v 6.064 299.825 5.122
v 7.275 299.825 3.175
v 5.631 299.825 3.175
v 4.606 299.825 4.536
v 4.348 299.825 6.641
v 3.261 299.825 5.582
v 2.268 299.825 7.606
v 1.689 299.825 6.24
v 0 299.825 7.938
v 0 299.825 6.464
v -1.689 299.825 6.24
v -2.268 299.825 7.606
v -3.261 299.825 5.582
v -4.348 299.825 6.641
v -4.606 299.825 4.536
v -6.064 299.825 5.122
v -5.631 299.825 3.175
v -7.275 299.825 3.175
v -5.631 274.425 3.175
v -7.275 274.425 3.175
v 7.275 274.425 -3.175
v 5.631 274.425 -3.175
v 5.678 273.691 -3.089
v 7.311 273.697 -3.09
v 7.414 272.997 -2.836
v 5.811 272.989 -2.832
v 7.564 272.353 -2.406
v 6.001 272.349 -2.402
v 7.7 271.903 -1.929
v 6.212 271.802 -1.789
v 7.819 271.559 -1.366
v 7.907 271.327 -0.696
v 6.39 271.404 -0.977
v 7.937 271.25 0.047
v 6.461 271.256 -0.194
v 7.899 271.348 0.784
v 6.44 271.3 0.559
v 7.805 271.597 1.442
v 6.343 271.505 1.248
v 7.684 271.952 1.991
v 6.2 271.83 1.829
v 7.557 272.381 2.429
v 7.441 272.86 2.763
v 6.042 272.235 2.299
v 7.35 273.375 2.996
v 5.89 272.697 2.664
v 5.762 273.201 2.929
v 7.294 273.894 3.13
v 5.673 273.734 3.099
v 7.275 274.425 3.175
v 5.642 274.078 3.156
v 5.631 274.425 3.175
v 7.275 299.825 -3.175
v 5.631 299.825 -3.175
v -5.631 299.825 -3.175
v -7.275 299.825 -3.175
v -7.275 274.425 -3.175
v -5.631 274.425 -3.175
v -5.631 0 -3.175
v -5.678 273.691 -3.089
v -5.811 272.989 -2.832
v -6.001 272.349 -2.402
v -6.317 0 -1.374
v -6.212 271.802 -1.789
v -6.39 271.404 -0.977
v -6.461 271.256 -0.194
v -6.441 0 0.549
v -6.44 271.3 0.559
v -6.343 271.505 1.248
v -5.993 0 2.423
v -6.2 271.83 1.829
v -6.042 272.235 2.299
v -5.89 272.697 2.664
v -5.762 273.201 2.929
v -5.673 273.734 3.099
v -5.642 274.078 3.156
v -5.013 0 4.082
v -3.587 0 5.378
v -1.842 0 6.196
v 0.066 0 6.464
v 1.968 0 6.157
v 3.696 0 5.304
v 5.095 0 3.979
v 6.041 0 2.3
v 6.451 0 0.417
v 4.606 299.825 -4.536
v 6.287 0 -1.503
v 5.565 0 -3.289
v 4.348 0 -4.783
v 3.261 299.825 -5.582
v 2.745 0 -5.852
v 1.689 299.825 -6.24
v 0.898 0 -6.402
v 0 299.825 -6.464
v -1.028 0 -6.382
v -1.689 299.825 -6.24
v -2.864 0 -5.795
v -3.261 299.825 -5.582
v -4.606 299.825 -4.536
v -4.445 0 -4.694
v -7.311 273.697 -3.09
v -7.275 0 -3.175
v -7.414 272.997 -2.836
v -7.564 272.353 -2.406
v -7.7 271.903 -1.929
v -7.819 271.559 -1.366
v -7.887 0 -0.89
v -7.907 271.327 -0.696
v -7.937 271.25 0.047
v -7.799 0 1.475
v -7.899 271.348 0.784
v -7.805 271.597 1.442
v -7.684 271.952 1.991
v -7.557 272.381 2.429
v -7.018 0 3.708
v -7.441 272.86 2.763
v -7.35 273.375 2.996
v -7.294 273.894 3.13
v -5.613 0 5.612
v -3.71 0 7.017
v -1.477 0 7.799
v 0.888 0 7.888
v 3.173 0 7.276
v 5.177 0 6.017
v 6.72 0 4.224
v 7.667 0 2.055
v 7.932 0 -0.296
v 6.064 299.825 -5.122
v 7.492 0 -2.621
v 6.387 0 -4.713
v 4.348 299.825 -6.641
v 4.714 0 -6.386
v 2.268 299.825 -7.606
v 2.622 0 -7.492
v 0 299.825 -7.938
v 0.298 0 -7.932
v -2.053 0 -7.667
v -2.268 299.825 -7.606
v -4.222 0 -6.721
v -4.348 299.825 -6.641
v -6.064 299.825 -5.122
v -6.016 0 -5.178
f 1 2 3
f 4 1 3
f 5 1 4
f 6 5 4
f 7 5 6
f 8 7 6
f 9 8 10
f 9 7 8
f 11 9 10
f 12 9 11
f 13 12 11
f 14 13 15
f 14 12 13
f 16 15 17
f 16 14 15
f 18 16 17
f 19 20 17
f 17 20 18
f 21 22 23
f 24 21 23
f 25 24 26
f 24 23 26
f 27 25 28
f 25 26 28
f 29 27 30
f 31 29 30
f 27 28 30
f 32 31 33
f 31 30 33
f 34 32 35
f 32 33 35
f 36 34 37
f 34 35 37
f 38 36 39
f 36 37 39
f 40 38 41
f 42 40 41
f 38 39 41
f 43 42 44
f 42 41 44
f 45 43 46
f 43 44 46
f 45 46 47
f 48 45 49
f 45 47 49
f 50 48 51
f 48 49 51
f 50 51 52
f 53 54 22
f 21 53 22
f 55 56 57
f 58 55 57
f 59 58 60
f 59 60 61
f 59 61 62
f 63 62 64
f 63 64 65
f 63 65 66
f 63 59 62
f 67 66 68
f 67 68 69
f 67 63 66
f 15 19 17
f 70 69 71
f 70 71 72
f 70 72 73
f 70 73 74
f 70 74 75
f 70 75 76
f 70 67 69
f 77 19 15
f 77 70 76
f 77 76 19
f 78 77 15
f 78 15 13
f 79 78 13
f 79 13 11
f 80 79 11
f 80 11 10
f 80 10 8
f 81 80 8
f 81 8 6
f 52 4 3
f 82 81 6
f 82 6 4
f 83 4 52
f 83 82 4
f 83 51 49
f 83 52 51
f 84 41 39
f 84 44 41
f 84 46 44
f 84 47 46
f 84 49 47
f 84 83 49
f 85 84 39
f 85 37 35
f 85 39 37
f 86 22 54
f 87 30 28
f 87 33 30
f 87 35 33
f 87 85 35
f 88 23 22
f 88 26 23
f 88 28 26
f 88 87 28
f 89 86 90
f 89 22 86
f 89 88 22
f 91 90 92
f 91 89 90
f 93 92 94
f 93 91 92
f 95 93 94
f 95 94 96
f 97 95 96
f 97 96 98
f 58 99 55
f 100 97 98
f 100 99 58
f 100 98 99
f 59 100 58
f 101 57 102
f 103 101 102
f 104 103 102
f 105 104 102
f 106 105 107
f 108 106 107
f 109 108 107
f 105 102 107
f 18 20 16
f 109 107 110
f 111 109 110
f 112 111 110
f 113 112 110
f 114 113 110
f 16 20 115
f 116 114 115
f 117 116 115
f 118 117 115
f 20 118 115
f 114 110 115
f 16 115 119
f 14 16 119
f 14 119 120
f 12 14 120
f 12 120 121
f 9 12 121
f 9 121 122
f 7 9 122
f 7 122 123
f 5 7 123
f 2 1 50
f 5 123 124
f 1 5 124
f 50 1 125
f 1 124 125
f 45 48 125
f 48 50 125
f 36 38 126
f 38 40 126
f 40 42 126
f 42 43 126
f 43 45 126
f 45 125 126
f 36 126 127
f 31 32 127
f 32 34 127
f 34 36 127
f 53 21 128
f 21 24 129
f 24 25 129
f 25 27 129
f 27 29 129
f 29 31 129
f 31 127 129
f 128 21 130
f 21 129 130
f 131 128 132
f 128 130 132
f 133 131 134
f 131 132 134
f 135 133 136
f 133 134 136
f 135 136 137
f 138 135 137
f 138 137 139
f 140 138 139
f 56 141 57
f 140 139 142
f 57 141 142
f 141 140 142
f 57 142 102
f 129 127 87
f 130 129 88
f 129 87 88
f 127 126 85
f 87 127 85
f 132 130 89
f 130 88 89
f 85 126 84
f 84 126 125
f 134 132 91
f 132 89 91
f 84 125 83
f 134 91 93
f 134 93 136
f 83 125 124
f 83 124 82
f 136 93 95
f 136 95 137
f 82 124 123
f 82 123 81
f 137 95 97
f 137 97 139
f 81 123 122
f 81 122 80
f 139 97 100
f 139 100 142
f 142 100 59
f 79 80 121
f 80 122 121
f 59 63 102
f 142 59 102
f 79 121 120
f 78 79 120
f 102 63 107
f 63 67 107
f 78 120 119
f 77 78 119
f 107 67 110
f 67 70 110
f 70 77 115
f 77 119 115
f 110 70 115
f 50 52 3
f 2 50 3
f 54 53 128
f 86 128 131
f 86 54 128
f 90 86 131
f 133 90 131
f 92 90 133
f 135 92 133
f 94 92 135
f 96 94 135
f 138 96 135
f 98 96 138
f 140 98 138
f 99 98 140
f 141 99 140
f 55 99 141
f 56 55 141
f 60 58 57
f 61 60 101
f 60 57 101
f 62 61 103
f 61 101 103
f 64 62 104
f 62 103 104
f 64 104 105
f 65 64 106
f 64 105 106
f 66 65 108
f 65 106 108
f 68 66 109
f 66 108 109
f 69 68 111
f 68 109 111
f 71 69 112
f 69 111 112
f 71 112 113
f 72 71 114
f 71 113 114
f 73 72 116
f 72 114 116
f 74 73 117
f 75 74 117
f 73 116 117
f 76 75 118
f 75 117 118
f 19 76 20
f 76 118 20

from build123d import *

# Parameters (mm, degrees)
SKETCH1_R               = 7.9375
SKETCH1_R_2             = 6.4643
BOSS_EXTRUDE1_DEPTH     = 299.825008041
CUT_EXTRUDE1_DEPTH      = 9.525
CUT_EXTRUDE1_DEPTH_BACK = 9.525


with BuildPart() as part:
    # Sketch1 → Boss-Extrude1 (new body)
    with BuildSketch(Plane(origin=(0, 0, 0), x_dir=(1, 0, 0), z_dir=(0, 1, 0))):
        with Locations(Location((0, 0, 0), (0, 0, 156.421821522))):
            Circle(SKETCH1_R)
        with Locations(Location((0, 0, 0), (0, 0, 150.583203301))):
            Circle(SKETCH1_R_2, mode=Mode.SUBTRACT)
    extrude(amount=BOSS_EXTRUDE1_DEPTH)

    # Sketch2 → Cut-Extrude1 (cut, two sides: drawn at the far end of the back side and taken through both)
    with BuildSketch(Plane(origin=(0, 0, 0), x_dir=(0, 0, -1), z_dir=(1, 0, 0)).offset(-CUT_EXTRUDE1_DEPTH_BACK)):
        with BuildLine():
            Line((3.175, 299.825008041), (3.175, 274.425008041))
            ThreePointArc((3.175, 274.425008041), (0, 271.250008041), (-3.175, 274.425008041))
            Line((-3.175, 274.425008041), (-3.175, 299.825008041))
            Line((-3.175, 299.825008041), (3.175, 299.825008041))
        make_face()
    extrude(amount=CUT_EXTRUDE1_DEPTH + CUT_EXTRUDE1_DEPTH_BACK, mode=Mode.SUBTRACT)


solid = part.part
